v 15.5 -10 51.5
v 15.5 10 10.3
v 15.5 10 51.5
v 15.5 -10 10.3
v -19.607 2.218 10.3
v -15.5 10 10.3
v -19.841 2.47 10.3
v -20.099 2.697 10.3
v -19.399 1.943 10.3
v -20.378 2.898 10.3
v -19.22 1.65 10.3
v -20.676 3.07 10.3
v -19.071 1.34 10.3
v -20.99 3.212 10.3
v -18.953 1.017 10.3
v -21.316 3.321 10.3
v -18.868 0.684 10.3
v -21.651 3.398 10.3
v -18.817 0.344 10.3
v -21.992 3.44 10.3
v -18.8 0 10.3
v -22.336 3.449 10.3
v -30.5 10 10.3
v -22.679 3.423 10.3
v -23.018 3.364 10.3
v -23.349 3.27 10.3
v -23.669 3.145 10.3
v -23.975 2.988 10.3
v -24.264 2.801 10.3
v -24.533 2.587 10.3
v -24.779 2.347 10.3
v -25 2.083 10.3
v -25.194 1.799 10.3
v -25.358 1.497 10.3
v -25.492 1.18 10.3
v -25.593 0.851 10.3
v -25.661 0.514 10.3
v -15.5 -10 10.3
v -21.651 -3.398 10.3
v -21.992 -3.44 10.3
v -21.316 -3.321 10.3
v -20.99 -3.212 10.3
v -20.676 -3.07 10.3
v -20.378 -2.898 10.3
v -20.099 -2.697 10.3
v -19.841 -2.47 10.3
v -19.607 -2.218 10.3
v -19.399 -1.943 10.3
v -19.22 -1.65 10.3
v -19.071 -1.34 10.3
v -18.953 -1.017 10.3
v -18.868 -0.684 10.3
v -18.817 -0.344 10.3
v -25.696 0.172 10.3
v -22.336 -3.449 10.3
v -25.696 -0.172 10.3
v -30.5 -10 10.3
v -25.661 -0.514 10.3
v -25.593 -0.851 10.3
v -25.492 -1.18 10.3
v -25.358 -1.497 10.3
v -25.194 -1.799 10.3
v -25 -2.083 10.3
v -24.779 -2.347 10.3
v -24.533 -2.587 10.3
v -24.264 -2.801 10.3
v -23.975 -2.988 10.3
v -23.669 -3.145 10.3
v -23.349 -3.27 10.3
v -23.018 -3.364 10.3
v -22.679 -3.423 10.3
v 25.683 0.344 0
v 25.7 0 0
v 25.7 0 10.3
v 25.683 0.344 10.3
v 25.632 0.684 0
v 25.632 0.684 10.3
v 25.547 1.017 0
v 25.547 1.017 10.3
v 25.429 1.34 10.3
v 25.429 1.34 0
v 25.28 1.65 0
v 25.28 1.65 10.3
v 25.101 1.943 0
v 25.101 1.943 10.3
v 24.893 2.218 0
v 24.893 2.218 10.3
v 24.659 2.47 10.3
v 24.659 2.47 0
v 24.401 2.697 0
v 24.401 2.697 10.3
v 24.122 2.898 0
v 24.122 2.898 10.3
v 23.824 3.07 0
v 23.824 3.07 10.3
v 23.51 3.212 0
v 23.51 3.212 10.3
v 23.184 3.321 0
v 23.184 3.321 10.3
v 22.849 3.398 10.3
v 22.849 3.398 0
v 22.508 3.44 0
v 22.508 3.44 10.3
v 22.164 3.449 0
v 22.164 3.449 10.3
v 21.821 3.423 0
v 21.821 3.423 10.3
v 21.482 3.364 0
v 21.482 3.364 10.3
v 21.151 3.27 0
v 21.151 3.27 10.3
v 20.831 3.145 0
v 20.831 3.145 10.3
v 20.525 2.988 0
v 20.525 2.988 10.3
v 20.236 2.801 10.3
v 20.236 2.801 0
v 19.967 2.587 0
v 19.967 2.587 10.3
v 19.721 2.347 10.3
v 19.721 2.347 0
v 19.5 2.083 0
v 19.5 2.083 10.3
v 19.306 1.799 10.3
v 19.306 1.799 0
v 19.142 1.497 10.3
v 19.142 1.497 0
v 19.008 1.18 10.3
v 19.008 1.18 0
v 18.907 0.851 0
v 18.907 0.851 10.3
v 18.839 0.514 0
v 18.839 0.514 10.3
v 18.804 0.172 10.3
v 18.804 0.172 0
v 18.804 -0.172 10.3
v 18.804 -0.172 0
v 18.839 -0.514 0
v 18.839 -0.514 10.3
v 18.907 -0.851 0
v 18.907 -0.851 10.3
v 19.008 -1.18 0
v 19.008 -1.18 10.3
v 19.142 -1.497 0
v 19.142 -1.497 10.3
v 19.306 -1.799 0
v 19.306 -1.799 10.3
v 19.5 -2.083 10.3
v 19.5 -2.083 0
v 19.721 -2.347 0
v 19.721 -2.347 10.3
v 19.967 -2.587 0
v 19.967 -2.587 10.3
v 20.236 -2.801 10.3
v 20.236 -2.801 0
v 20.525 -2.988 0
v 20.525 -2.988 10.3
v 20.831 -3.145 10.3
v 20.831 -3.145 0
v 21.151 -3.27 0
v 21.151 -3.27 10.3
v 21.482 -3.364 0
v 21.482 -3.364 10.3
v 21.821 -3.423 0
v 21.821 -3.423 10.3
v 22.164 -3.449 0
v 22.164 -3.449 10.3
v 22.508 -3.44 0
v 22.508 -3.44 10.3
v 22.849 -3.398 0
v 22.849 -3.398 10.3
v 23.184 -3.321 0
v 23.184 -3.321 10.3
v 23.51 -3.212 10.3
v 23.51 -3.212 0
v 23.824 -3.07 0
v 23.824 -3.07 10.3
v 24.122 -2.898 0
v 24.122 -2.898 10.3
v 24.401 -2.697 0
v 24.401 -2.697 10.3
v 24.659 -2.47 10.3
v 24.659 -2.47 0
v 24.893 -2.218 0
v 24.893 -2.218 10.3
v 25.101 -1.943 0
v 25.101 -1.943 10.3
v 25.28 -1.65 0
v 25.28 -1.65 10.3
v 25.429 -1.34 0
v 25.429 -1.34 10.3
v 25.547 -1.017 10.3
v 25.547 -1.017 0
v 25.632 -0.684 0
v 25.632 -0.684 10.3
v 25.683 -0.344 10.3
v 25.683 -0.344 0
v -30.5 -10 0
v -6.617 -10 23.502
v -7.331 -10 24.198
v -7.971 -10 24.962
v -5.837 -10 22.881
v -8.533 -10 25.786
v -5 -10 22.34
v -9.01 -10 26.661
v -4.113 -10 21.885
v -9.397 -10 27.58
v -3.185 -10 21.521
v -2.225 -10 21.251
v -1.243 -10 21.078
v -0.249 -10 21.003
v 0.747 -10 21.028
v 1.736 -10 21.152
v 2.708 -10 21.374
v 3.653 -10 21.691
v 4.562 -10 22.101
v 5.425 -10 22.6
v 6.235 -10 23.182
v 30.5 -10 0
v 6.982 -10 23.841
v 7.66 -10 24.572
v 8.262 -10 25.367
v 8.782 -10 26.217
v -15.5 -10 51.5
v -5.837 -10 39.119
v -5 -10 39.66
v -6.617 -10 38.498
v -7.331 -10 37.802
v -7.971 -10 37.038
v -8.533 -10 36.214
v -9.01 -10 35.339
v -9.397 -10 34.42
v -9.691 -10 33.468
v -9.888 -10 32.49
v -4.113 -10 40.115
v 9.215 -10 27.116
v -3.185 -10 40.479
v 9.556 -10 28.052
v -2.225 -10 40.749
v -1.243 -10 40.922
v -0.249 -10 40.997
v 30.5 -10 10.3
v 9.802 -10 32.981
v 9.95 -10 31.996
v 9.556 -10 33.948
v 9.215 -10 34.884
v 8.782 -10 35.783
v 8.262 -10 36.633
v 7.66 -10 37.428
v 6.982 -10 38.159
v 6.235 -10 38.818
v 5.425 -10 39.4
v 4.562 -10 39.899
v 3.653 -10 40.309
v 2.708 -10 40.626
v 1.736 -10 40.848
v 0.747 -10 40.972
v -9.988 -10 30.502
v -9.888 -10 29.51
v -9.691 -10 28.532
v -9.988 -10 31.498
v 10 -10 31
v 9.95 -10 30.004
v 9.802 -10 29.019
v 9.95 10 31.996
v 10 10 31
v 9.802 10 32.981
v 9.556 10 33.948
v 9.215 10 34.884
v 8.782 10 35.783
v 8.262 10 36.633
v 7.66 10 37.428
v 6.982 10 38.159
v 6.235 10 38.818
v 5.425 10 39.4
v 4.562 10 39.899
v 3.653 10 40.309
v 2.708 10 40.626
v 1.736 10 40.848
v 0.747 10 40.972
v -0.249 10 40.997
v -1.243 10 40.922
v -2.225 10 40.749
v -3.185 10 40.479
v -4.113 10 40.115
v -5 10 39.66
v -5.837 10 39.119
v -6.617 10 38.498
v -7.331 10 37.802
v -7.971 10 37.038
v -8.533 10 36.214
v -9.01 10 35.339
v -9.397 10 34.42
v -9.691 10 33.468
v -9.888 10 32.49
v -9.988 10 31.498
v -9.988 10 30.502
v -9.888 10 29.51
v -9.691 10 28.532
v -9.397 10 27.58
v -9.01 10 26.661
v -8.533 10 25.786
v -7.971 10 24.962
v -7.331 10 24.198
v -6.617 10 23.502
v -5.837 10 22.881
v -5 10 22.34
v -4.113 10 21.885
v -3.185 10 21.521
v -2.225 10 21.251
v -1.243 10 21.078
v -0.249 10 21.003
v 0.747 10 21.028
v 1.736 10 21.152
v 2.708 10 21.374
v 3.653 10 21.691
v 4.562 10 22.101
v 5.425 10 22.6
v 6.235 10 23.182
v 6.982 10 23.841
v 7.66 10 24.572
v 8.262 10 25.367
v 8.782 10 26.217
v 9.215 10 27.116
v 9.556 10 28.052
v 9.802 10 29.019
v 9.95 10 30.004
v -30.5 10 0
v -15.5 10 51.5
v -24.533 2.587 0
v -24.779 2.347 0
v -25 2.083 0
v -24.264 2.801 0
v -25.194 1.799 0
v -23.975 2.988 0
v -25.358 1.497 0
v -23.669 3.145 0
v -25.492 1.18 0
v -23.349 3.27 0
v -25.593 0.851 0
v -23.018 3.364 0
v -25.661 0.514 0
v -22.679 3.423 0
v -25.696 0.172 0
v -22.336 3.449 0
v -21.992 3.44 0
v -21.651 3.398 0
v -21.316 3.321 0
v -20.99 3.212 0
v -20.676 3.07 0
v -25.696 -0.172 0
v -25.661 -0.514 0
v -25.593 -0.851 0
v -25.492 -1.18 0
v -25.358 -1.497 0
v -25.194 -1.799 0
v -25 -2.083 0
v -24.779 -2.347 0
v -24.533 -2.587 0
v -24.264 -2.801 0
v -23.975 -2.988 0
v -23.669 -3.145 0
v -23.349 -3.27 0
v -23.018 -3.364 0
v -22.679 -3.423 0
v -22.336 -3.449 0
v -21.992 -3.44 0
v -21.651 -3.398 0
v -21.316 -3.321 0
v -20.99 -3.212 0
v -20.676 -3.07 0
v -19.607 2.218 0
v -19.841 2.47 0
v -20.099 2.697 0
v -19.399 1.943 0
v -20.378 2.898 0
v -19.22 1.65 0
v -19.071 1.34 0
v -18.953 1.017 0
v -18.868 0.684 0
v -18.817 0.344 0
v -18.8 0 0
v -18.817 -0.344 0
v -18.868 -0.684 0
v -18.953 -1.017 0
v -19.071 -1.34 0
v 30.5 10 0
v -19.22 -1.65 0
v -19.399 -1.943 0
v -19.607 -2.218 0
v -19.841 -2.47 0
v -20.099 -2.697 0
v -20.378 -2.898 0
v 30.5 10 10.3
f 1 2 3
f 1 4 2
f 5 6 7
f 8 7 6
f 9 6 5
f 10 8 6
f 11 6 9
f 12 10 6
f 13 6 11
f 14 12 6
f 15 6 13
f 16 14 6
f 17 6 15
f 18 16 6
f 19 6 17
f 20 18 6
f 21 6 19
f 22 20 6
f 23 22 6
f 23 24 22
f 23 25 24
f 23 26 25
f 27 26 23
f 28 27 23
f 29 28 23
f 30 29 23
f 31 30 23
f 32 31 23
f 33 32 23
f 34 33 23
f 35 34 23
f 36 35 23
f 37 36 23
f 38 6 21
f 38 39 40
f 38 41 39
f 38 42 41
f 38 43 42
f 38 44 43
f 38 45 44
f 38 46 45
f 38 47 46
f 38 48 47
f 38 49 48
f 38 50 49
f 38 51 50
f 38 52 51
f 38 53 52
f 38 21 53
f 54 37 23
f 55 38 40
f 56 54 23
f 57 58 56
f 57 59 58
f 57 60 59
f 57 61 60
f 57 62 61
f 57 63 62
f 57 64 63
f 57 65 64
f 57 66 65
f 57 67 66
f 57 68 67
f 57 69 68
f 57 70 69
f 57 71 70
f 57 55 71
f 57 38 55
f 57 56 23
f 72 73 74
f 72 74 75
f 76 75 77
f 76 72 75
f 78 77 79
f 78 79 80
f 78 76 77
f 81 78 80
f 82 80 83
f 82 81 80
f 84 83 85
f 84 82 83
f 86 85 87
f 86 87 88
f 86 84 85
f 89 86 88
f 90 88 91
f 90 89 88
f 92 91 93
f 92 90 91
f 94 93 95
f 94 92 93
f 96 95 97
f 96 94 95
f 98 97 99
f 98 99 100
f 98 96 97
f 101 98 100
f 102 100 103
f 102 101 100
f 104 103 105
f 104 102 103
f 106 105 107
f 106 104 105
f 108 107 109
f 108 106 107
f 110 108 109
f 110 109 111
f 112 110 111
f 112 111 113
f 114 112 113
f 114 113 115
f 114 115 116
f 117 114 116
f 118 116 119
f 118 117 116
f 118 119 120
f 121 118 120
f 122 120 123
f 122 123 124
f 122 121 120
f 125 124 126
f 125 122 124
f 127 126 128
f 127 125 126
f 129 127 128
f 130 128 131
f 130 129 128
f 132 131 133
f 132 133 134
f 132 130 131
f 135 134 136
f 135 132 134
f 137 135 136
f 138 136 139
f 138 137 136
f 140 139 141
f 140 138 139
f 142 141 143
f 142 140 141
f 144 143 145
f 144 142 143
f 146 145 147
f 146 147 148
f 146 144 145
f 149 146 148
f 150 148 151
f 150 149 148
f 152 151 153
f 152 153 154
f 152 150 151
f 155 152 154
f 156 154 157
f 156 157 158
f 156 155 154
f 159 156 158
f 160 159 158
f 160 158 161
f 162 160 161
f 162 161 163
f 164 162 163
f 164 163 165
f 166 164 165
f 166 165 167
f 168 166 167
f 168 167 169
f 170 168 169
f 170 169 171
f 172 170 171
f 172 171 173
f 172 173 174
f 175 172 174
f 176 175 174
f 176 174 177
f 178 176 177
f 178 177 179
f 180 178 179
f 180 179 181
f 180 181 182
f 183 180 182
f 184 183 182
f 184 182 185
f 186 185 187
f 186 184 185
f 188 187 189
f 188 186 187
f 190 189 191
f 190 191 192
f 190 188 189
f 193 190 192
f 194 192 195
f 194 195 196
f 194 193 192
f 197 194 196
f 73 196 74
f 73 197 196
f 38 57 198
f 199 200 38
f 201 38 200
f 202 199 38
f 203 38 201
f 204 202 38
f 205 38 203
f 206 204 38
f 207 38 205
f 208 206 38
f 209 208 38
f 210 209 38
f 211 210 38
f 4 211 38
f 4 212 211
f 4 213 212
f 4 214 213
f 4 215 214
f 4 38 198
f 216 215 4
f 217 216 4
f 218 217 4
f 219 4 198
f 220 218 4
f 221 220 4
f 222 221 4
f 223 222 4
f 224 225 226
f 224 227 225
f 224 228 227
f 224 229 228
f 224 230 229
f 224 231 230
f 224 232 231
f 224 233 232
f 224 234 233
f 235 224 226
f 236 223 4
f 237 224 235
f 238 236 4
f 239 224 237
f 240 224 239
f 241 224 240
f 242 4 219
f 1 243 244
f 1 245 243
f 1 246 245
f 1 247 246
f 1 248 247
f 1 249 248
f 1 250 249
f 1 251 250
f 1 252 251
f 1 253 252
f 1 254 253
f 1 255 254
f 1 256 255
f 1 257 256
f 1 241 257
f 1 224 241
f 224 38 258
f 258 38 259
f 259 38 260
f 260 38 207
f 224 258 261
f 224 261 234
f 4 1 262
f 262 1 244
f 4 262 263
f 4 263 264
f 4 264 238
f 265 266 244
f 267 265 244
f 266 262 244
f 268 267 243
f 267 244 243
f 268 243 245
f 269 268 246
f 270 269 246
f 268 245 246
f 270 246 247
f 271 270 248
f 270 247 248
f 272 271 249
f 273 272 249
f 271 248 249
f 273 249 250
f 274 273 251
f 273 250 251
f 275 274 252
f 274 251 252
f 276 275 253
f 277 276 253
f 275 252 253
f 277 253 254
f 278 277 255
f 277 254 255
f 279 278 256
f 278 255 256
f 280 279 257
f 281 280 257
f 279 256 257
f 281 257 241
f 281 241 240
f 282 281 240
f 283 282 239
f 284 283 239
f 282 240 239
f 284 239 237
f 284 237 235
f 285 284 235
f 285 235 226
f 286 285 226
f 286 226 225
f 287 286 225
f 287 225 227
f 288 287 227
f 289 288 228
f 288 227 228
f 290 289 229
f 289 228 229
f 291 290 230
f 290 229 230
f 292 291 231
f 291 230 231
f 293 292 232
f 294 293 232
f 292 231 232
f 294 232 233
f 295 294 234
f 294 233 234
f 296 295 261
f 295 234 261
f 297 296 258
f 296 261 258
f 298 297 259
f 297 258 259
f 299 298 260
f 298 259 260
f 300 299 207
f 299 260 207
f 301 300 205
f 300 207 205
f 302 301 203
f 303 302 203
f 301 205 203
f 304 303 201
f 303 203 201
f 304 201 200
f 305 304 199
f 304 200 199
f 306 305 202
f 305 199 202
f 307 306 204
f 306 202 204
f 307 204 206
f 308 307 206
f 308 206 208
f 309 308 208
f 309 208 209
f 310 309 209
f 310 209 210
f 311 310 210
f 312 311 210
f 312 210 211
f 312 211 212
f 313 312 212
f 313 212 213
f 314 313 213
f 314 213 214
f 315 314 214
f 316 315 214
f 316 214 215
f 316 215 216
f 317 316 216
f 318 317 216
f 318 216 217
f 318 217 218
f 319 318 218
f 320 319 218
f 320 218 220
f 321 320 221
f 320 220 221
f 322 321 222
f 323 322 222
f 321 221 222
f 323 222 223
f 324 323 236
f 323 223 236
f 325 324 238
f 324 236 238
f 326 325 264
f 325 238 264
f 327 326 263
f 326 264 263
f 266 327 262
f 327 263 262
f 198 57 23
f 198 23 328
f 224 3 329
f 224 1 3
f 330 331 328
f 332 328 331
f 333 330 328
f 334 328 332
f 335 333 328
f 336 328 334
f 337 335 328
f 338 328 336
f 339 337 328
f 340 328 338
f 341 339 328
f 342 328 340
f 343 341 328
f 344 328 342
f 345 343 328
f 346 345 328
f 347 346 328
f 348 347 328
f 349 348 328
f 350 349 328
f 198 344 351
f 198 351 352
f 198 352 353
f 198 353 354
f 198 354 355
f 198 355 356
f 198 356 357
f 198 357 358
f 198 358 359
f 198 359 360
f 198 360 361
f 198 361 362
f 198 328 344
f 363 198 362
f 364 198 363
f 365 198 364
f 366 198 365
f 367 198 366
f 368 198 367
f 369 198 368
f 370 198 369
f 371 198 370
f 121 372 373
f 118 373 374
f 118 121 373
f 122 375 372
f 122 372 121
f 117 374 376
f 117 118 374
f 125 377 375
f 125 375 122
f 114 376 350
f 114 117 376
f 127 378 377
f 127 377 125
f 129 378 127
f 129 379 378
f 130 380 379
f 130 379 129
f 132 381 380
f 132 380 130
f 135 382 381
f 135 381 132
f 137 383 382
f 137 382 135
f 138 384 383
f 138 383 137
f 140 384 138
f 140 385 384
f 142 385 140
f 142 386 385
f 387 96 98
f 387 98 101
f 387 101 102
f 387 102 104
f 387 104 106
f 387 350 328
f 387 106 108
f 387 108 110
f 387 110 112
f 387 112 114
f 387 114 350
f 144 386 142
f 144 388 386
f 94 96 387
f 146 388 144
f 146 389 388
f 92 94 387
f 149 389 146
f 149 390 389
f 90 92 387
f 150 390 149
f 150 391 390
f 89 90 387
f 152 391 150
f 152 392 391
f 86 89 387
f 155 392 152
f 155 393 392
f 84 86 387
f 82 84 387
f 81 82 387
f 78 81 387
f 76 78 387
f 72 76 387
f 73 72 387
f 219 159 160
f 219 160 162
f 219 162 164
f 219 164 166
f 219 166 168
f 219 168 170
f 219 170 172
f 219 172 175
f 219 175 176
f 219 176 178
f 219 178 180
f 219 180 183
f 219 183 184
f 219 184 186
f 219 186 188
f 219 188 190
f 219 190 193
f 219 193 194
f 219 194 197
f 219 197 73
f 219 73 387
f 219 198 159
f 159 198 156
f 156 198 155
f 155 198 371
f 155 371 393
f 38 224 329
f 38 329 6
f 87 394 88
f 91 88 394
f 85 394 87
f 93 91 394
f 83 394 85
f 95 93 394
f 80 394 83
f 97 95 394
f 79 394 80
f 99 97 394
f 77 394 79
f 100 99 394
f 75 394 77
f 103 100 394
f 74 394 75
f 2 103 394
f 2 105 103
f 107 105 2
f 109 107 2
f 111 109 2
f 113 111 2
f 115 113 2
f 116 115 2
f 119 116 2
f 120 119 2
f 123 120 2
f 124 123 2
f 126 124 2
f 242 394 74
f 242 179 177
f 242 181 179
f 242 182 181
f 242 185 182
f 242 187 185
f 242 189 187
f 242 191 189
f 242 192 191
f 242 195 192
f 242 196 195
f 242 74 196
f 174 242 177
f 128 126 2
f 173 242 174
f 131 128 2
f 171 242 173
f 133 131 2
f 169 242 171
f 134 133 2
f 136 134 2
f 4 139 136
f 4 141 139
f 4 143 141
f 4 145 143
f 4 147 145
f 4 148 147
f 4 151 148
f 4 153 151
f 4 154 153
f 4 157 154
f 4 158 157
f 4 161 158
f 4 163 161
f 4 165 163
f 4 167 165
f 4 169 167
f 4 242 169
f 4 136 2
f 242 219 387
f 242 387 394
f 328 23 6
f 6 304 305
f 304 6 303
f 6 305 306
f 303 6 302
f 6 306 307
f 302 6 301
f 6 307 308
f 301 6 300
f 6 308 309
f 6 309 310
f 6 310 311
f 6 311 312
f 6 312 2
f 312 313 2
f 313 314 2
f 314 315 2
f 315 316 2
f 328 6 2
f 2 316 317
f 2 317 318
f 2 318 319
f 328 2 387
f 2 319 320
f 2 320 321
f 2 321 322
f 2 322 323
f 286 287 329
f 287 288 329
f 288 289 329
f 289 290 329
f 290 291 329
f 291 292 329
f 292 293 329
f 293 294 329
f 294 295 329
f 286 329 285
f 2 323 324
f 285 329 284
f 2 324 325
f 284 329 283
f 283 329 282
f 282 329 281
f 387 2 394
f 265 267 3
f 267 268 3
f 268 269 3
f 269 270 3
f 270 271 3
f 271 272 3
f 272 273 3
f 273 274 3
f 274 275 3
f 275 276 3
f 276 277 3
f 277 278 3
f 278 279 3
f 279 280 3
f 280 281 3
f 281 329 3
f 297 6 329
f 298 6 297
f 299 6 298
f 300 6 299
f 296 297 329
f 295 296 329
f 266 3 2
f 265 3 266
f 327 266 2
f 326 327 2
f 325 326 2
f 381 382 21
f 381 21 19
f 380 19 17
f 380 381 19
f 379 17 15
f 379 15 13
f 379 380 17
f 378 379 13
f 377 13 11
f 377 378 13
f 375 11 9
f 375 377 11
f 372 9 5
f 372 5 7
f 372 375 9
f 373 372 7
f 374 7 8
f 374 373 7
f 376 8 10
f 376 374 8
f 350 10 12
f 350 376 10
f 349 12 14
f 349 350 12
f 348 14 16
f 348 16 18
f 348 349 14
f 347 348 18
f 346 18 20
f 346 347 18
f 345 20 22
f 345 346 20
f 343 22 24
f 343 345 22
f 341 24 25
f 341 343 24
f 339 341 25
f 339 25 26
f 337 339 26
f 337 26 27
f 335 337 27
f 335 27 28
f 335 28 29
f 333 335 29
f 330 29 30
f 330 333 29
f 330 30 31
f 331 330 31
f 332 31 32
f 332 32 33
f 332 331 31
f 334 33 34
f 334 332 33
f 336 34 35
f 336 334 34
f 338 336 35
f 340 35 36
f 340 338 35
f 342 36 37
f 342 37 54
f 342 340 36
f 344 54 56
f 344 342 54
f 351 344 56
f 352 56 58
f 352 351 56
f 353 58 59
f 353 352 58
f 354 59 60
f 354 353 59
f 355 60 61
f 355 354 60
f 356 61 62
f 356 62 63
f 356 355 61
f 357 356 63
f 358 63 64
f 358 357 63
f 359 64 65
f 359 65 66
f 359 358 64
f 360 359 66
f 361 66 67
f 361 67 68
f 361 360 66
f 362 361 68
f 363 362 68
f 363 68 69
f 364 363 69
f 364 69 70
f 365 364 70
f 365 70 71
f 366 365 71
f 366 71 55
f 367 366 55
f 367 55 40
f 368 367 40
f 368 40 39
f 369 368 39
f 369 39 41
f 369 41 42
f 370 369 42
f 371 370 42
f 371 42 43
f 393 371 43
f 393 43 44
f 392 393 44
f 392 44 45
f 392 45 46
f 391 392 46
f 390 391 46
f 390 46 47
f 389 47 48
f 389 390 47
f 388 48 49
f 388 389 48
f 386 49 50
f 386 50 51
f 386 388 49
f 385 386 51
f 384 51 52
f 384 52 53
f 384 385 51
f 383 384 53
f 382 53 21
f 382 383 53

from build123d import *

# Parameters (mm, degrees)
F1_DEPTH = 10
F2_R     = 10
F3_DEPTH = 10
F4_R     = 3.45
F5_DEPTH = 10.3


with BuildPart() as f1:
    # F0 (on Front) → F1 (new body, symmetric)
    with BuildSketch(Plane.XZ):
        Polygon((15.5, 51.5), (-15.5, 51.5), (-15.5, 10.3), (-30.5, 10.3), (-30.5, 0), (30.5, 0), (30.5, 10.3), (15.5, 10.3), align=None)
    extrude(amount=F1_DEPTH, both=True)

    # F2 (on Front) → F3 (cut, symmetric)
    with BuildSketch(Plane.XZ):
        with Locations((0, 31)):
            Circle(F2_R)
    extrude(amount=F3_DEPTH, both=True, mode=Mode.SUBTRACT)

    # F4 (on Top) → F5 (cut, through all)
    with BuildSketch(Plane.XY):
        with Locations((-22.25, 0)):
            Circle(F4_R)
        with Locations((22.25, 0)):
            Circle(F4_R)
    extrude(amount=F5_DEPTH, mode=Mode.SUBTRACT)


solid = f1.part
